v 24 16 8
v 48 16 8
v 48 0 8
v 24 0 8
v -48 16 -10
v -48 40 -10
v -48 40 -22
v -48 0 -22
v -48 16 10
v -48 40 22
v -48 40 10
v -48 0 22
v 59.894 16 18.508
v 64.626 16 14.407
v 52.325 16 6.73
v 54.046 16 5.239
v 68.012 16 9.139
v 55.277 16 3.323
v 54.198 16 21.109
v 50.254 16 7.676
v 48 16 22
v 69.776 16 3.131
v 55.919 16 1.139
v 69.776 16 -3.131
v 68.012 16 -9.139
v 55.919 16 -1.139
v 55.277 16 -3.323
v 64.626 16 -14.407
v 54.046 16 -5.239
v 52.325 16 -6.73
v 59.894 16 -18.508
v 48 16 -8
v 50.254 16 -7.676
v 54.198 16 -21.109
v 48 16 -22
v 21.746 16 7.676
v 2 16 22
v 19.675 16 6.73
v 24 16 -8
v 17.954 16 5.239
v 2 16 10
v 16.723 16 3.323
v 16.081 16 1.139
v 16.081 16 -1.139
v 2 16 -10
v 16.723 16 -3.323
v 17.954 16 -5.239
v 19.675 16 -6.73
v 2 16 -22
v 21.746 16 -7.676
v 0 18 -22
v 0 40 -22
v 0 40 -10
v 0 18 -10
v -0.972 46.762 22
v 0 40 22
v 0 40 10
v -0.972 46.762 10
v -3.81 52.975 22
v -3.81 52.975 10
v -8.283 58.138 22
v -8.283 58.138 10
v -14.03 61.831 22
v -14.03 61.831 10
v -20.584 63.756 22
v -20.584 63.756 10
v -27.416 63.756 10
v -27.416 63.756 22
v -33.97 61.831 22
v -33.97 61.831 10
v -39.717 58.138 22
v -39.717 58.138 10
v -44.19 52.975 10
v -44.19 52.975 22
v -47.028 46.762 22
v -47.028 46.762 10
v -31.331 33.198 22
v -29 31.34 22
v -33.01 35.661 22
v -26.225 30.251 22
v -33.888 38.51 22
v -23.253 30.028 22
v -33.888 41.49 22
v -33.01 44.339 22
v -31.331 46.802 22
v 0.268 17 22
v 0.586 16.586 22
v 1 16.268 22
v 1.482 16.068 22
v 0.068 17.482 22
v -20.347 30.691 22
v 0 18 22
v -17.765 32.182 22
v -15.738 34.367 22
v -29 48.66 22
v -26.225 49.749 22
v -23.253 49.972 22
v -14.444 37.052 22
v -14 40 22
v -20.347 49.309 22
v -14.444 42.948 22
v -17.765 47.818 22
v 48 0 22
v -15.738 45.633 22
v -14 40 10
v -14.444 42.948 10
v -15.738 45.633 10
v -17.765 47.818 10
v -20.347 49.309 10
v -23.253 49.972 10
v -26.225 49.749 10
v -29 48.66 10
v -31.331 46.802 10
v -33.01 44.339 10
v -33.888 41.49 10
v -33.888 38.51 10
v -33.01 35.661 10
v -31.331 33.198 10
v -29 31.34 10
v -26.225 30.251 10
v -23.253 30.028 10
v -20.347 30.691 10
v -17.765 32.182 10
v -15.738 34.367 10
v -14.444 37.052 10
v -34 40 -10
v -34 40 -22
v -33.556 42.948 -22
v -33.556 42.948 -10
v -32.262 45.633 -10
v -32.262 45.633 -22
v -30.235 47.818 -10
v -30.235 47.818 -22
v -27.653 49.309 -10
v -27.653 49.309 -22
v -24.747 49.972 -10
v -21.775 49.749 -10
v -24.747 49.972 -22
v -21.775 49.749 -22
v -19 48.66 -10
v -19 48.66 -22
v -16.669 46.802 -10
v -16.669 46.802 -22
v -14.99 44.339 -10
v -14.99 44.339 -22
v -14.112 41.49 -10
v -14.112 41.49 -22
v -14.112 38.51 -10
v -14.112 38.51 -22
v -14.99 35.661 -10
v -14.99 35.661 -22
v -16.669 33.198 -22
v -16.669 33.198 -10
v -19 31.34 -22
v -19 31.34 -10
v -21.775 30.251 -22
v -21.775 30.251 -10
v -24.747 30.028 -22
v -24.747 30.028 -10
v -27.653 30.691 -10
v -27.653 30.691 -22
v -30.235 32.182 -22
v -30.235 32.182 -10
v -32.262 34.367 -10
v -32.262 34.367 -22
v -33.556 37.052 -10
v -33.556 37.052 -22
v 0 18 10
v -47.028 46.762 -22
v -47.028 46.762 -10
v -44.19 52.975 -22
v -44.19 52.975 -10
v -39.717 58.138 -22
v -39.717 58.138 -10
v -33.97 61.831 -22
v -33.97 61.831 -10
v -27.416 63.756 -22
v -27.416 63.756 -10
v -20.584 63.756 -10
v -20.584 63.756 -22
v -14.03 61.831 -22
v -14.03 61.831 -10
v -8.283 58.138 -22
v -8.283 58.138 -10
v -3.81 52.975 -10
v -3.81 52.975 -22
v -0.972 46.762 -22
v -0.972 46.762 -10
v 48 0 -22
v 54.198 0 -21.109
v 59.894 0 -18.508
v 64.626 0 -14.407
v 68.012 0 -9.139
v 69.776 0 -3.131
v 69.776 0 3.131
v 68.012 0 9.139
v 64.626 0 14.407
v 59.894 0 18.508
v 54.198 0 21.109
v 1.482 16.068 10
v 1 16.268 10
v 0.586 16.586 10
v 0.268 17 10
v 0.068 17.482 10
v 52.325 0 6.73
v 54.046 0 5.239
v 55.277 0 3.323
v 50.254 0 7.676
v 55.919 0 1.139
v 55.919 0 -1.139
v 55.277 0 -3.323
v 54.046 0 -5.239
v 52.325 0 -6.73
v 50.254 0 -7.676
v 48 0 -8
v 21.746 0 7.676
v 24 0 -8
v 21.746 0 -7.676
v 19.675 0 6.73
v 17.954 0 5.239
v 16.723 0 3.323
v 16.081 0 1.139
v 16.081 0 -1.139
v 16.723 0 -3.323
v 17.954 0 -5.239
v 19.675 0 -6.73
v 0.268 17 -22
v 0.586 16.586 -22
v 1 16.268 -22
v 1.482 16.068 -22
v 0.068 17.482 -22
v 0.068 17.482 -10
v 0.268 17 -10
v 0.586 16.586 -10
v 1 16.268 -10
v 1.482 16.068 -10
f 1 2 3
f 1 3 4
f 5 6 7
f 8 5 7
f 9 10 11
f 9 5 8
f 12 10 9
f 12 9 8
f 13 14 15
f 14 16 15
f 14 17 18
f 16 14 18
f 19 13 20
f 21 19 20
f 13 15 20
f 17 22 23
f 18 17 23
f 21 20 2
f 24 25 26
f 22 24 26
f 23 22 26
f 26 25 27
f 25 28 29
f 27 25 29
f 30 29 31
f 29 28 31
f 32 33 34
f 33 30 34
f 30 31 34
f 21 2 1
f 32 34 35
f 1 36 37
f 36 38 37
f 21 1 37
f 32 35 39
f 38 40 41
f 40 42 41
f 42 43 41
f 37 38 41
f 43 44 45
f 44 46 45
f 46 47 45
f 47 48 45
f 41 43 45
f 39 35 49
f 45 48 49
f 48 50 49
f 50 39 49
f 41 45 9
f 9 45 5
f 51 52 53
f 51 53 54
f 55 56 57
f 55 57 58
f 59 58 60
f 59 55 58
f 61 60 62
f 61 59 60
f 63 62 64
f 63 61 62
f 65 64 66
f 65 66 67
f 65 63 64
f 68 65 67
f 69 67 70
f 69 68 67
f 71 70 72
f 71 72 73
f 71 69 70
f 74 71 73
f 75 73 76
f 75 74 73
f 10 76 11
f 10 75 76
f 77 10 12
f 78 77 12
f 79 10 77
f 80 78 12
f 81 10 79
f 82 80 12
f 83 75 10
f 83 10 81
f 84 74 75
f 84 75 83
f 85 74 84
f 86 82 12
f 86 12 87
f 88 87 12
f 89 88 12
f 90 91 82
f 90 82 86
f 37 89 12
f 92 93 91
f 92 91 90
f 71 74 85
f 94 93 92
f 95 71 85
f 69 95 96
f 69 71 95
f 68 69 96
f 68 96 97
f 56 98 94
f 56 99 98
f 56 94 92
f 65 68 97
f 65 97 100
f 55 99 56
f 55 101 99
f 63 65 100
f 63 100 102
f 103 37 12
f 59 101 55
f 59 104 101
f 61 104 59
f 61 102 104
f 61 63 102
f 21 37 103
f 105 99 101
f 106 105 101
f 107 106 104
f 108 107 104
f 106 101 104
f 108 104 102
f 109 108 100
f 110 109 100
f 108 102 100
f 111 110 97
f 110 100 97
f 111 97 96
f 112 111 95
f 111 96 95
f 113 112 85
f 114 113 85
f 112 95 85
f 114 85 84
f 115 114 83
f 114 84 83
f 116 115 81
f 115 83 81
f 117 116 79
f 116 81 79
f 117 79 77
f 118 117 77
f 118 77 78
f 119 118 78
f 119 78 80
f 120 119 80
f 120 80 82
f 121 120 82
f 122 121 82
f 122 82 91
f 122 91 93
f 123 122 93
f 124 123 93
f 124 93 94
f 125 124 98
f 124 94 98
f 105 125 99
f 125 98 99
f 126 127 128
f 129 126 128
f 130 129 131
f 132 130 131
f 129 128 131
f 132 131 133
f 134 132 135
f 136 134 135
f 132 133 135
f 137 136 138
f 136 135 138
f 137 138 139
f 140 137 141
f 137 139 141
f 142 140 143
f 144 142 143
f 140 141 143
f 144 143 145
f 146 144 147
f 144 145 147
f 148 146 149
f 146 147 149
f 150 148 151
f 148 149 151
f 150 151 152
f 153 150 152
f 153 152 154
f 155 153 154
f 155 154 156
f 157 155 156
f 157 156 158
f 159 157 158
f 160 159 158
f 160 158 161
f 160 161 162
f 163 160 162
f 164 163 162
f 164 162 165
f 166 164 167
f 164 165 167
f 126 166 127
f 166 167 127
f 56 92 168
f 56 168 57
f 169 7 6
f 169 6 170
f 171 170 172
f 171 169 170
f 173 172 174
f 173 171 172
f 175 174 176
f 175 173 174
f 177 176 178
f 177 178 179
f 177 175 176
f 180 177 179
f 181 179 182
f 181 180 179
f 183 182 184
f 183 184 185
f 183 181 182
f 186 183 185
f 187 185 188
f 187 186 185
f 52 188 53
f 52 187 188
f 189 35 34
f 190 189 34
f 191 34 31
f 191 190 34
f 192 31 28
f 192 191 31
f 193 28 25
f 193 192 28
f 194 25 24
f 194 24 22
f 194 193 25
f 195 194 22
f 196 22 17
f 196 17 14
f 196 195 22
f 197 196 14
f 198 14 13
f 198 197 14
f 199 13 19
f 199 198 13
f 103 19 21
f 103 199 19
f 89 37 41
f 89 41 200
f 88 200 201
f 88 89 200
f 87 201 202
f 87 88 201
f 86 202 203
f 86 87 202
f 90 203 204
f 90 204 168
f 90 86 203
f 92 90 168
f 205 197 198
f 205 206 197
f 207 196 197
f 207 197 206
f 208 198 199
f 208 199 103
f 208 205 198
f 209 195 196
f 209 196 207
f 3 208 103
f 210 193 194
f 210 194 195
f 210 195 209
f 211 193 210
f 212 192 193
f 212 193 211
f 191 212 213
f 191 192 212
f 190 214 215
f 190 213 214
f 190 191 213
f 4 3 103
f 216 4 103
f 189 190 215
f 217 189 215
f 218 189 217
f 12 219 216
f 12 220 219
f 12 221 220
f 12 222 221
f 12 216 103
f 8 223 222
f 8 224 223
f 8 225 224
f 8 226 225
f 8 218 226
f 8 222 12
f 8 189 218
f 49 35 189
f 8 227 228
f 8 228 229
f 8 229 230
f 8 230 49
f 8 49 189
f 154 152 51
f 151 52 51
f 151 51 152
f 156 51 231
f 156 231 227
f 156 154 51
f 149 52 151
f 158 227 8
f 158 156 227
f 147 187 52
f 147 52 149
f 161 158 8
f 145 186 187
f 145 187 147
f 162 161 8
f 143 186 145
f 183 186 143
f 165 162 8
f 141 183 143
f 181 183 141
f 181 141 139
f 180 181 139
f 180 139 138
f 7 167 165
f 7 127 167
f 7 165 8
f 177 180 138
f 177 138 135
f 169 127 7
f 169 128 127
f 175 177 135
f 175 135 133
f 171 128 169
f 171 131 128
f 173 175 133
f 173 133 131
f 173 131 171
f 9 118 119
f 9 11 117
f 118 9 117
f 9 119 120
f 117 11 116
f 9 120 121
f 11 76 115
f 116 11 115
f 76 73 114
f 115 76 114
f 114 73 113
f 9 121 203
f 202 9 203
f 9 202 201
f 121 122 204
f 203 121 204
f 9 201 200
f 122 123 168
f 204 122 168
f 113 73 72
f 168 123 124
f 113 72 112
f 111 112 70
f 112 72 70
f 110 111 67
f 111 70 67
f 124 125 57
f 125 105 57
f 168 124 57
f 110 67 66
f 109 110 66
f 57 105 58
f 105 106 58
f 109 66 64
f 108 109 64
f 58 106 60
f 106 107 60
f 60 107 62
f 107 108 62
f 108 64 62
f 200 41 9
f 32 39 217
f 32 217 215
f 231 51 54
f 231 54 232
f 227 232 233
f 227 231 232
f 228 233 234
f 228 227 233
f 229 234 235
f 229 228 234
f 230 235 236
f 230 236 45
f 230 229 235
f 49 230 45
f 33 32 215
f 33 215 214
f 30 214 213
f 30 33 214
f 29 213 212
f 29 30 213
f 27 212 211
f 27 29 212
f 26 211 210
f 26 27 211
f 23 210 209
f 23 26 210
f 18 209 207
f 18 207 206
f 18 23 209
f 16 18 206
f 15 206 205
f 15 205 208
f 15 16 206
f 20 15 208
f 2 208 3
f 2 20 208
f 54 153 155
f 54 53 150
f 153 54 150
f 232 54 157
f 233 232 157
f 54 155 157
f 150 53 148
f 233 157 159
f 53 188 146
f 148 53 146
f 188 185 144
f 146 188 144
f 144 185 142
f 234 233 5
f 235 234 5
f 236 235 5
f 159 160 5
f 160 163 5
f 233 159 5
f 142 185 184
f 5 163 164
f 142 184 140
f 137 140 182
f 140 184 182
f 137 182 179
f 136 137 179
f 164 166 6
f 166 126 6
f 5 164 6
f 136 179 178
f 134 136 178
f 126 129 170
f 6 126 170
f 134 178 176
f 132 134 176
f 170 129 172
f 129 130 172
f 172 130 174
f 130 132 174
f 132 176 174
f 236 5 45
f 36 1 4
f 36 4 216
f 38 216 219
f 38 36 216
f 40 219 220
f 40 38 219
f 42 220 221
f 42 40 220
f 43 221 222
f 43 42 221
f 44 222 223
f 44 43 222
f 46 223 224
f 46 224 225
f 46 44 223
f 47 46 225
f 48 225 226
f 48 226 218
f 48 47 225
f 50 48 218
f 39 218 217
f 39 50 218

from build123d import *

# Parameters (mm, degrees)
BOSS_EXTRUDE1_DEPTH = 16
CUT_EXTRUDE2_DEPTH  = 16
SKETCH5_R           = 10
BOSS_EXTRUDE3_DEPTH = 12
SKETCH7_R           = 10
BOSS_EXTRUDE4_DEPTH = 12


with BuildPart() as part:
    # Sketch2 → Boss-Extrude1 (new body)
    with BuildSketch(Plane(origin=(0, 0, 0), x_dir=(1, 0, 0), z_dir=(0, 1, 0))):
        with BuildLine():
            Line((-48, 22), (48, 22))
            ThreePointArc((48, 22), (70, 0), (48, -22))
            Line((48, -22), (-48, -22))
            Line((-48, -22), (-48, 22))
        make_face()
    extrude(amount=BOSS_EXTRUDE1_DEPTH)

    # Sketch3 → Cut-Extrude2 (cut)
    with BuildSketch(Plane(origin=(0, 16, 0), x_dir=(1, 0, 0), z_dir=(0, 1, 0))):
        with BuildLine():
            Line((48, -8), (24, -8))
            ThreePointArc((24, -8), (16, 0), (24, 8))
            Line((24, 8), (48, 8))
            ThreePointArc((48, 8), (56, 0), (48, -8))
        make_face()
    extrude(amount=-CUT_EXTRUDE2_DEPTH, mode=Mode.SUBTRACT)

    # Sketch5 → Boss-Extrude3 (add)
    with BuildSketch(Plane.XY.offset(22)):
        with BuildLine():
            Line((-48, 40), (-48, 16))
            Line((-48, 16), (2, 16))
            ThreePointArc((2, 16), (0.585786438, 16.585786438), (0, 18))
            Line((0, 18), (0, 40))
            ThreePointArc((0, 40), (-24, 64), (-48, 40))
        make_face()
        with Locations((-24, 40)):
            Circle(SKETCH5_R, mode=Mode.SUBTRACT)
    extrude(amount=-BOSS_EXTRUDE3_DEPTH)

    # Sketch7 → Boss-Extrude4 (add)
    with BuildSketch(Plane(origin=(0, 0, -22), x_dir=(-1, 0, 0), z_dir=(0, 0, -1))):
        with BuildLine():
            Line((-2, 16), (48, 16))
            Line((48, 16), (48, 40))
            ThreePointArc((48, 40), (24, 64), (0, 40))
            Line((0, 40), (0, 18))
            ThreePointArc((0, 18), (-0.585786438, 16.585786438), (-2, 16))
        make_face()
        with Locations((24, 40)):
            Circle(SKETCH7_R, mode=Mode.SUBTRACT)
    extrude(amount=-BOSS_EXTRUDE4_DEPTH)


solid = part.part
